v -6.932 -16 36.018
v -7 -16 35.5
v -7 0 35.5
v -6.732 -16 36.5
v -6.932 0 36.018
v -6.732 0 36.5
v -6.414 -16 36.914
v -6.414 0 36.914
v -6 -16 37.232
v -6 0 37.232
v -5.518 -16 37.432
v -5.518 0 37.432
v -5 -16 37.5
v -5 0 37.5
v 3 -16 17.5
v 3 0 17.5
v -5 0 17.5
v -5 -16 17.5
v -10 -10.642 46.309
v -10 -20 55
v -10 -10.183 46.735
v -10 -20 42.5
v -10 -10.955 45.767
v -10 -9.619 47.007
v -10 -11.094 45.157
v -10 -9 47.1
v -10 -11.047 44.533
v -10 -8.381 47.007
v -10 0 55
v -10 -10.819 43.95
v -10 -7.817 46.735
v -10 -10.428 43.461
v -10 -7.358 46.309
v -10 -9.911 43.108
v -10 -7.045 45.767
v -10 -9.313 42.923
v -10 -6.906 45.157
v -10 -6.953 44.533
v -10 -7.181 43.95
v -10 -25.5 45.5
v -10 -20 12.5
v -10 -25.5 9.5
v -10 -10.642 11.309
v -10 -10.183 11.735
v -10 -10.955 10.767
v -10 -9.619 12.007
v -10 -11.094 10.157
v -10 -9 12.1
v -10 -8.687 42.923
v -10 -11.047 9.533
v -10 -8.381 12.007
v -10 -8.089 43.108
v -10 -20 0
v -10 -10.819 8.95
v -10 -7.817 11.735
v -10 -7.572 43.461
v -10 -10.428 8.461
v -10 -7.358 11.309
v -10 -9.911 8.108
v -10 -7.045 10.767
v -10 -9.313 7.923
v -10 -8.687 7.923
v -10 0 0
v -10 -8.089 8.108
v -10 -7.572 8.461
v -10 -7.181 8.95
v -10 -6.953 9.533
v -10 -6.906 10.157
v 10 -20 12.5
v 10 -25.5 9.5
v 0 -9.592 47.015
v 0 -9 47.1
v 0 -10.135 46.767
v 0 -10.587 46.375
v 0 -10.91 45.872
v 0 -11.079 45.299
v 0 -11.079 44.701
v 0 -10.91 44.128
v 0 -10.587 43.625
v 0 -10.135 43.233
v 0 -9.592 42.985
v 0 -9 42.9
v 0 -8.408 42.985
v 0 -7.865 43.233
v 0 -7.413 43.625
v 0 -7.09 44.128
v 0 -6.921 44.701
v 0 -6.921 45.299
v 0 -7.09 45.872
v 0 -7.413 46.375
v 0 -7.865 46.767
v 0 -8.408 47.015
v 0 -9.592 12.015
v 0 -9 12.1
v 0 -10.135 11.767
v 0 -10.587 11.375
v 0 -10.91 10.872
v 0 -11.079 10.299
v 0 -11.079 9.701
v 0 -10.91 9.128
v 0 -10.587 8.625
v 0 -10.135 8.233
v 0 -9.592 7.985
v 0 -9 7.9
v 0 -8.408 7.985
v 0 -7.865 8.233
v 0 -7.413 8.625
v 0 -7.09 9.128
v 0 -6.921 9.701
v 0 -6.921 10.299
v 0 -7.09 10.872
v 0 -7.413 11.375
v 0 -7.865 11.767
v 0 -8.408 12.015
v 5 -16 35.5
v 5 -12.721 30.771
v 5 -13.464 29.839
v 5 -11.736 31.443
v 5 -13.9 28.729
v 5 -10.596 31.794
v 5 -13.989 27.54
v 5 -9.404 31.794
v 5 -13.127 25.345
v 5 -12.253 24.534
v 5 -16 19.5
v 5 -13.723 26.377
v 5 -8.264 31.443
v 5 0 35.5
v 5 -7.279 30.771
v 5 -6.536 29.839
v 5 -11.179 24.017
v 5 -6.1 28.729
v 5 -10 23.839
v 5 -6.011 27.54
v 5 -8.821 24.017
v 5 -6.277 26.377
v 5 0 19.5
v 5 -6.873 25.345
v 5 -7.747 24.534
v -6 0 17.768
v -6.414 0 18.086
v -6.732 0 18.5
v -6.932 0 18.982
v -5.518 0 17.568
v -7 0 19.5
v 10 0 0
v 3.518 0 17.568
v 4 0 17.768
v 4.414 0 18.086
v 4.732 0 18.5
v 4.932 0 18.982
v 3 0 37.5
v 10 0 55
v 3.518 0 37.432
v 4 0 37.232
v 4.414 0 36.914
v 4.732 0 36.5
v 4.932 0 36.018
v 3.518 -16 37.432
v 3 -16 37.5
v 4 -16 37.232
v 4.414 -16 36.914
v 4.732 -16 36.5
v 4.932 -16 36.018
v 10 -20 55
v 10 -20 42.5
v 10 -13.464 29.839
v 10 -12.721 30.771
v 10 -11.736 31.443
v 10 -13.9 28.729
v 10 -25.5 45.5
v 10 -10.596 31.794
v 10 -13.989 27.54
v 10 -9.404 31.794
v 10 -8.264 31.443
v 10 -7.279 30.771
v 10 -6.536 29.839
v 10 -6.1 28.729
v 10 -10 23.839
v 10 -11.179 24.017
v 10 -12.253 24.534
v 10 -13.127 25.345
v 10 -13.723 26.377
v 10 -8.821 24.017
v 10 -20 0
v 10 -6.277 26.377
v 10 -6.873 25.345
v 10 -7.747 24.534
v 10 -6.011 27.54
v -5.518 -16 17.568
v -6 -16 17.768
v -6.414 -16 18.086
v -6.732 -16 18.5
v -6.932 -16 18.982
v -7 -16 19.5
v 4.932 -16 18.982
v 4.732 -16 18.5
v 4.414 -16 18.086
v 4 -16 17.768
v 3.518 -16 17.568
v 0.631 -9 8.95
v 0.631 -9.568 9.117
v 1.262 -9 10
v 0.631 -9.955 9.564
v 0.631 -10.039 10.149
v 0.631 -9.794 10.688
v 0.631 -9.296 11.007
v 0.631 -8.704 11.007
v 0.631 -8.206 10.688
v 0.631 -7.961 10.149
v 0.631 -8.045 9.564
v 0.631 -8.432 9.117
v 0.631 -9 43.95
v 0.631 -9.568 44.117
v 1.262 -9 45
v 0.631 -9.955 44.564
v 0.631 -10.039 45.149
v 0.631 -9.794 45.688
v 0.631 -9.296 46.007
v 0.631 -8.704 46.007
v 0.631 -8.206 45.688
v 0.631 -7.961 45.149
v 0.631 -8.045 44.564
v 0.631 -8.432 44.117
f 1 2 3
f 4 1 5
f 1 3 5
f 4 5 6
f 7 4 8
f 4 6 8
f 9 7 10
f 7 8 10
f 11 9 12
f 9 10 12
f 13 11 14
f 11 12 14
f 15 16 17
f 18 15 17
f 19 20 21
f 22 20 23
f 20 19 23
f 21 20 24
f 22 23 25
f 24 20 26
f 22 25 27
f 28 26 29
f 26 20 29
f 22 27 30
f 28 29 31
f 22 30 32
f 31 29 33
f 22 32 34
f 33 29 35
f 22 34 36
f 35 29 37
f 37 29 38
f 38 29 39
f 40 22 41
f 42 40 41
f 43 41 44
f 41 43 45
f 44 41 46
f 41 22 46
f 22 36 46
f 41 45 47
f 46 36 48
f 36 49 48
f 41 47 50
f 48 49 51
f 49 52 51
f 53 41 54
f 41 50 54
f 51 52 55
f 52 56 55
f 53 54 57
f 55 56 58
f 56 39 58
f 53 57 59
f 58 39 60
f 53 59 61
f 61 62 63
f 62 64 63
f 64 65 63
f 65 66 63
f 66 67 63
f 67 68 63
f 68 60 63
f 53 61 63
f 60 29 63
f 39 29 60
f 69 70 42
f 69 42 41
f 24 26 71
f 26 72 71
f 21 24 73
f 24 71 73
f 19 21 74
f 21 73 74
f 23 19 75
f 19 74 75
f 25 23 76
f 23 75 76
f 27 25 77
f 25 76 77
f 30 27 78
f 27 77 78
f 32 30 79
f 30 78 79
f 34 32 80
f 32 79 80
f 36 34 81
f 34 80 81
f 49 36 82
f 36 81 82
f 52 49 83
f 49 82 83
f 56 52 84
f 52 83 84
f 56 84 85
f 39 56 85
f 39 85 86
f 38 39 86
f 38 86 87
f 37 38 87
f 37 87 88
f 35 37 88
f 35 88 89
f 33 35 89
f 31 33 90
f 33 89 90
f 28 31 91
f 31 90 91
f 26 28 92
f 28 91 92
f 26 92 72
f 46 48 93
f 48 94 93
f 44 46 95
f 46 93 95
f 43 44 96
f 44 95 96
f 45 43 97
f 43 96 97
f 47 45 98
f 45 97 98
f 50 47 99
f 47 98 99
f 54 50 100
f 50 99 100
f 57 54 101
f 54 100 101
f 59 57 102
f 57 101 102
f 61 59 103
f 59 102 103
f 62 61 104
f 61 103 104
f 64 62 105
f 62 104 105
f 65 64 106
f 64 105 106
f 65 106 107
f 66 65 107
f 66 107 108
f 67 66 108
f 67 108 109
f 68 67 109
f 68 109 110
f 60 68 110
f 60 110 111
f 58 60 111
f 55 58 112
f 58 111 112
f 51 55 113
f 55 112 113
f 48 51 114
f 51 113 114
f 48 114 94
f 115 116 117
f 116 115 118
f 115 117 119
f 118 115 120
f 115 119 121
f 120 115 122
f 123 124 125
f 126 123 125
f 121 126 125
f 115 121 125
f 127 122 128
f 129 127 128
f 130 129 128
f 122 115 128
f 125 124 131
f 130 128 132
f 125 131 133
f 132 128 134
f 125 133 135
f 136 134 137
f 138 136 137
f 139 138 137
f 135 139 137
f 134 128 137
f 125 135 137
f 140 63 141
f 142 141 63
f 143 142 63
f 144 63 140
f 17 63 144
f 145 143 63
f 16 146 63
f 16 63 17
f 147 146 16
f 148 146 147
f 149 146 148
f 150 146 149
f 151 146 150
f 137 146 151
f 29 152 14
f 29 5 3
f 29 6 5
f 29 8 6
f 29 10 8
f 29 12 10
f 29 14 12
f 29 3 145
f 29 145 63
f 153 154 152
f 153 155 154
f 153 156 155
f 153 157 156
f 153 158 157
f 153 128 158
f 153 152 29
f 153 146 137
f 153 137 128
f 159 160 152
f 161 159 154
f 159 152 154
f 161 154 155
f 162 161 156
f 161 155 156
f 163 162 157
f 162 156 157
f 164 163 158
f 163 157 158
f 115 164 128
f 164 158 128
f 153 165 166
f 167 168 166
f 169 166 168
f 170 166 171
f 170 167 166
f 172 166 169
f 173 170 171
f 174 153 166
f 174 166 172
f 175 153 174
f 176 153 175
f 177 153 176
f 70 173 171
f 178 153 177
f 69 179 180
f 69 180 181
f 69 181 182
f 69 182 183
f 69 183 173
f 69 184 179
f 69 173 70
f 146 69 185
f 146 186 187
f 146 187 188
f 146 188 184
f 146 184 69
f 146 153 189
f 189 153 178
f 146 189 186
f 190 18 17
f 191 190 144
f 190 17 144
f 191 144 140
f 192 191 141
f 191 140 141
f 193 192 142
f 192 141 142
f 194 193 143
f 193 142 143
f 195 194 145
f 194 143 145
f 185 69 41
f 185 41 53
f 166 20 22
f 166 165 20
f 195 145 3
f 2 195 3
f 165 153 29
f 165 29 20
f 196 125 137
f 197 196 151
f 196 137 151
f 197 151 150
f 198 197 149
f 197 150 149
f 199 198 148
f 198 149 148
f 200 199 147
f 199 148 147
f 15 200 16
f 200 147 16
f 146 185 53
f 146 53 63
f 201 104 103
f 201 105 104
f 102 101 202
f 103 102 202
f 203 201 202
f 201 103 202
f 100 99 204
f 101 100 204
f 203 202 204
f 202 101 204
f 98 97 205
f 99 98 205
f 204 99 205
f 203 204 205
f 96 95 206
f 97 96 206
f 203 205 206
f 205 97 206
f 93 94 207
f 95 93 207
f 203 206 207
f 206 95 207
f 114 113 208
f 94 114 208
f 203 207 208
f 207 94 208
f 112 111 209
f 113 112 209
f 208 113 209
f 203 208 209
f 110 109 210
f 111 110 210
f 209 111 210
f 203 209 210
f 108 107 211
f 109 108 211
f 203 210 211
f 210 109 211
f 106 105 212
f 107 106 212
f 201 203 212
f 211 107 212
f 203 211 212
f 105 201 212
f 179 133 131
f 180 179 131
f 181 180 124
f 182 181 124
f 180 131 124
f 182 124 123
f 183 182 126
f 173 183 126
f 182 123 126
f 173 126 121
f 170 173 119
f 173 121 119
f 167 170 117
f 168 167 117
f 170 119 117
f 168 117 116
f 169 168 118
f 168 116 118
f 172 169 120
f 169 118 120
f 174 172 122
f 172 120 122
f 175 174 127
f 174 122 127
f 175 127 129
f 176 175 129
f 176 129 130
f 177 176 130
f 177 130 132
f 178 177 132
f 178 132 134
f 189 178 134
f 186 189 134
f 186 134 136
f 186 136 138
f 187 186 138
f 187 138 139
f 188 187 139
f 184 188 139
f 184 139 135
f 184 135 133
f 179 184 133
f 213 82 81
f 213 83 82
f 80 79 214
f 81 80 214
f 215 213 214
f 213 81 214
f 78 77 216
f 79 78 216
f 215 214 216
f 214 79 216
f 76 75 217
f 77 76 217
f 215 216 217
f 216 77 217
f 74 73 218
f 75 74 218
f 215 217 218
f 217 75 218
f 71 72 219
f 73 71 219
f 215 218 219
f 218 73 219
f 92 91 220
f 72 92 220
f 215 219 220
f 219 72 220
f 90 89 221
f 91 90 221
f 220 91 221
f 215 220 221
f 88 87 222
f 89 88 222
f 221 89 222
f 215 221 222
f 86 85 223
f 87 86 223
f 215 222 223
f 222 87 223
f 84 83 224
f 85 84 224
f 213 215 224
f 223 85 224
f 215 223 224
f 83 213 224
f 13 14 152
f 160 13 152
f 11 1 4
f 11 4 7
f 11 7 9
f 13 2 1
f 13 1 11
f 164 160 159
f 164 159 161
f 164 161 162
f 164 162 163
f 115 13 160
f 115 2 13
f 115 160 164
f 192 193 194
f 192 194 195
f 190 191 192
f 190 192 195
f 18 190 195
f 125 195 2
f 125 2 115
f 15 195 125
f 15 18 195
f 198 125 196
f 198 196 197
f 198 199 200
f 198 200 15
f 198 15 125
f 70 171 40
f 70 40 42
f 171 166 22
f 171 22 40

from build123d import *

# Parameters (mm, degrees)
BOSS_EXTRUDE1_DEPTH             = 10
F_8_0MM_DOWEL_HOLE2_D           = 8
F_8_0MM_DOWEL_HOLE2_DEPTH       = 5
TAP_DRILL_FOR_M5X0_8_TAP1_D     = 4.2
TAP_DRILL_FOR_M5X0_8_TAP1_DEPTH = 10
TAP_DRILL_FOR_M5X0_8_TAP1_TIP   = 1.2618073
SKETCH7_OUTSIDE_W               = 34.768
SKETCH7_OUTSIDE_H               = 69.768
SKETCH7_OUTSIDE_W_2             = 20
SKETCH7_OUTSIDE_H_2             = 55
CUT_EXTRUDE1_DEPTH              = 16


with BuildPart() as part:
    # Sketch1 → Boss-Extrude1 (new body, symmetric)
    with BuildSketch(Plane(origin=(0, 0, 0), x_dir=(0, 0, -1), z_dir=(1, 0, 0))):
        Polygon((-55, -20), (-42.5, -20), (-45.5, -25.5), (-9.5, -25.5), (-12.5, -20), (0, -20), (0, 0), (-55, 0), align=None)
    extrude(amount=BOSS_EXTRUDE1_DEPTH, both=True)

    # Ø8.0mm Dowel Hole2
    with Locations(Plane(origin=(10, -10, 27.838852212), x_dir=(0, 0, 1), z_dir=(1, 0, 0))):
        with Locations((0, 0)):
            Hole(F_8_0MM_DOWEL_HOLE2_D / 2, depth=F_8_0MM_DOWEL_HOLE2_DEPTH)

    # Tap Drill for M5x0.8 Tap1
    with Locations(Plane(origin=(-10, -9, 10), x_dir=(0, 0, -1), z_dir=(-1, 0, 0))):
        with Locations((0, 0), (-35, 0)):
            Hole(TAP_DRILL_FOR_M5X0_8_TAP1_D / 2, depth=TAP_DRILL_FOR_M5X0_8_TAP1_DEPTH)
            with Locations((0, 0, -(TAP_DRILL_FOR_M5X0_8_TAP1_DEPTH + TAP_DRILL_FOR_M5X0_8_TAP1_TIP / 2))):  # 118° drill point
                Cone(0, TAP_DRILL_FOR_M5X0_8_TAP1_D / 2, TAP_DRILL_FOR_M5X0_8_TAP1_TIP, mode=Mode.SUBTRACT)

    # Sketch7 outside → Cut-Extrude1 (cut)
    with BuildSketch(Plane(origin=(0, 0, 0), x_dir=(1, 0, 0), z_dir=(0, 1, 0))):
        with Locations((0, -27.5)):
            Rectangle(SKETCH7_OUTSIDE_W, SKETCH7_OUTSIDE_H)
        with Locations((0, -27.5)):
            Rectangle(SKETCH7_OUTSIDE_W_2, SKETCH7_OUTSIDE_H_2, mode=Mode.SUBTRACT)
        with BuildLine():
            Line((3, -17.5), (-5, -17.5))
            ThreePointArc((-5, -17.5), (-6.414213562, -18.085786438), (-7, -19.5))
            Line((-7, -19.5), (-7, -35.5))
            ThreePointArc((-7, -35.5), (-6.414213562, -36.914213562), (-5, -37.5))
            Line((-5, -37.5), (3, -37.5))
            ThreePointArc((3, -37.5), (4.414213562, -36.914213562), (5, -35.5))
            Line((5, -35.5), (5, -19.5))
            ThreePointArc((5, -19.5), (4.414213562, -18.085786438), (3, -17.5))
        make_face()
    extrude(amount=-CUT_EXTRUDE1_DEPTH, mode=Mode.SUBTRACT)


solid = part.part
